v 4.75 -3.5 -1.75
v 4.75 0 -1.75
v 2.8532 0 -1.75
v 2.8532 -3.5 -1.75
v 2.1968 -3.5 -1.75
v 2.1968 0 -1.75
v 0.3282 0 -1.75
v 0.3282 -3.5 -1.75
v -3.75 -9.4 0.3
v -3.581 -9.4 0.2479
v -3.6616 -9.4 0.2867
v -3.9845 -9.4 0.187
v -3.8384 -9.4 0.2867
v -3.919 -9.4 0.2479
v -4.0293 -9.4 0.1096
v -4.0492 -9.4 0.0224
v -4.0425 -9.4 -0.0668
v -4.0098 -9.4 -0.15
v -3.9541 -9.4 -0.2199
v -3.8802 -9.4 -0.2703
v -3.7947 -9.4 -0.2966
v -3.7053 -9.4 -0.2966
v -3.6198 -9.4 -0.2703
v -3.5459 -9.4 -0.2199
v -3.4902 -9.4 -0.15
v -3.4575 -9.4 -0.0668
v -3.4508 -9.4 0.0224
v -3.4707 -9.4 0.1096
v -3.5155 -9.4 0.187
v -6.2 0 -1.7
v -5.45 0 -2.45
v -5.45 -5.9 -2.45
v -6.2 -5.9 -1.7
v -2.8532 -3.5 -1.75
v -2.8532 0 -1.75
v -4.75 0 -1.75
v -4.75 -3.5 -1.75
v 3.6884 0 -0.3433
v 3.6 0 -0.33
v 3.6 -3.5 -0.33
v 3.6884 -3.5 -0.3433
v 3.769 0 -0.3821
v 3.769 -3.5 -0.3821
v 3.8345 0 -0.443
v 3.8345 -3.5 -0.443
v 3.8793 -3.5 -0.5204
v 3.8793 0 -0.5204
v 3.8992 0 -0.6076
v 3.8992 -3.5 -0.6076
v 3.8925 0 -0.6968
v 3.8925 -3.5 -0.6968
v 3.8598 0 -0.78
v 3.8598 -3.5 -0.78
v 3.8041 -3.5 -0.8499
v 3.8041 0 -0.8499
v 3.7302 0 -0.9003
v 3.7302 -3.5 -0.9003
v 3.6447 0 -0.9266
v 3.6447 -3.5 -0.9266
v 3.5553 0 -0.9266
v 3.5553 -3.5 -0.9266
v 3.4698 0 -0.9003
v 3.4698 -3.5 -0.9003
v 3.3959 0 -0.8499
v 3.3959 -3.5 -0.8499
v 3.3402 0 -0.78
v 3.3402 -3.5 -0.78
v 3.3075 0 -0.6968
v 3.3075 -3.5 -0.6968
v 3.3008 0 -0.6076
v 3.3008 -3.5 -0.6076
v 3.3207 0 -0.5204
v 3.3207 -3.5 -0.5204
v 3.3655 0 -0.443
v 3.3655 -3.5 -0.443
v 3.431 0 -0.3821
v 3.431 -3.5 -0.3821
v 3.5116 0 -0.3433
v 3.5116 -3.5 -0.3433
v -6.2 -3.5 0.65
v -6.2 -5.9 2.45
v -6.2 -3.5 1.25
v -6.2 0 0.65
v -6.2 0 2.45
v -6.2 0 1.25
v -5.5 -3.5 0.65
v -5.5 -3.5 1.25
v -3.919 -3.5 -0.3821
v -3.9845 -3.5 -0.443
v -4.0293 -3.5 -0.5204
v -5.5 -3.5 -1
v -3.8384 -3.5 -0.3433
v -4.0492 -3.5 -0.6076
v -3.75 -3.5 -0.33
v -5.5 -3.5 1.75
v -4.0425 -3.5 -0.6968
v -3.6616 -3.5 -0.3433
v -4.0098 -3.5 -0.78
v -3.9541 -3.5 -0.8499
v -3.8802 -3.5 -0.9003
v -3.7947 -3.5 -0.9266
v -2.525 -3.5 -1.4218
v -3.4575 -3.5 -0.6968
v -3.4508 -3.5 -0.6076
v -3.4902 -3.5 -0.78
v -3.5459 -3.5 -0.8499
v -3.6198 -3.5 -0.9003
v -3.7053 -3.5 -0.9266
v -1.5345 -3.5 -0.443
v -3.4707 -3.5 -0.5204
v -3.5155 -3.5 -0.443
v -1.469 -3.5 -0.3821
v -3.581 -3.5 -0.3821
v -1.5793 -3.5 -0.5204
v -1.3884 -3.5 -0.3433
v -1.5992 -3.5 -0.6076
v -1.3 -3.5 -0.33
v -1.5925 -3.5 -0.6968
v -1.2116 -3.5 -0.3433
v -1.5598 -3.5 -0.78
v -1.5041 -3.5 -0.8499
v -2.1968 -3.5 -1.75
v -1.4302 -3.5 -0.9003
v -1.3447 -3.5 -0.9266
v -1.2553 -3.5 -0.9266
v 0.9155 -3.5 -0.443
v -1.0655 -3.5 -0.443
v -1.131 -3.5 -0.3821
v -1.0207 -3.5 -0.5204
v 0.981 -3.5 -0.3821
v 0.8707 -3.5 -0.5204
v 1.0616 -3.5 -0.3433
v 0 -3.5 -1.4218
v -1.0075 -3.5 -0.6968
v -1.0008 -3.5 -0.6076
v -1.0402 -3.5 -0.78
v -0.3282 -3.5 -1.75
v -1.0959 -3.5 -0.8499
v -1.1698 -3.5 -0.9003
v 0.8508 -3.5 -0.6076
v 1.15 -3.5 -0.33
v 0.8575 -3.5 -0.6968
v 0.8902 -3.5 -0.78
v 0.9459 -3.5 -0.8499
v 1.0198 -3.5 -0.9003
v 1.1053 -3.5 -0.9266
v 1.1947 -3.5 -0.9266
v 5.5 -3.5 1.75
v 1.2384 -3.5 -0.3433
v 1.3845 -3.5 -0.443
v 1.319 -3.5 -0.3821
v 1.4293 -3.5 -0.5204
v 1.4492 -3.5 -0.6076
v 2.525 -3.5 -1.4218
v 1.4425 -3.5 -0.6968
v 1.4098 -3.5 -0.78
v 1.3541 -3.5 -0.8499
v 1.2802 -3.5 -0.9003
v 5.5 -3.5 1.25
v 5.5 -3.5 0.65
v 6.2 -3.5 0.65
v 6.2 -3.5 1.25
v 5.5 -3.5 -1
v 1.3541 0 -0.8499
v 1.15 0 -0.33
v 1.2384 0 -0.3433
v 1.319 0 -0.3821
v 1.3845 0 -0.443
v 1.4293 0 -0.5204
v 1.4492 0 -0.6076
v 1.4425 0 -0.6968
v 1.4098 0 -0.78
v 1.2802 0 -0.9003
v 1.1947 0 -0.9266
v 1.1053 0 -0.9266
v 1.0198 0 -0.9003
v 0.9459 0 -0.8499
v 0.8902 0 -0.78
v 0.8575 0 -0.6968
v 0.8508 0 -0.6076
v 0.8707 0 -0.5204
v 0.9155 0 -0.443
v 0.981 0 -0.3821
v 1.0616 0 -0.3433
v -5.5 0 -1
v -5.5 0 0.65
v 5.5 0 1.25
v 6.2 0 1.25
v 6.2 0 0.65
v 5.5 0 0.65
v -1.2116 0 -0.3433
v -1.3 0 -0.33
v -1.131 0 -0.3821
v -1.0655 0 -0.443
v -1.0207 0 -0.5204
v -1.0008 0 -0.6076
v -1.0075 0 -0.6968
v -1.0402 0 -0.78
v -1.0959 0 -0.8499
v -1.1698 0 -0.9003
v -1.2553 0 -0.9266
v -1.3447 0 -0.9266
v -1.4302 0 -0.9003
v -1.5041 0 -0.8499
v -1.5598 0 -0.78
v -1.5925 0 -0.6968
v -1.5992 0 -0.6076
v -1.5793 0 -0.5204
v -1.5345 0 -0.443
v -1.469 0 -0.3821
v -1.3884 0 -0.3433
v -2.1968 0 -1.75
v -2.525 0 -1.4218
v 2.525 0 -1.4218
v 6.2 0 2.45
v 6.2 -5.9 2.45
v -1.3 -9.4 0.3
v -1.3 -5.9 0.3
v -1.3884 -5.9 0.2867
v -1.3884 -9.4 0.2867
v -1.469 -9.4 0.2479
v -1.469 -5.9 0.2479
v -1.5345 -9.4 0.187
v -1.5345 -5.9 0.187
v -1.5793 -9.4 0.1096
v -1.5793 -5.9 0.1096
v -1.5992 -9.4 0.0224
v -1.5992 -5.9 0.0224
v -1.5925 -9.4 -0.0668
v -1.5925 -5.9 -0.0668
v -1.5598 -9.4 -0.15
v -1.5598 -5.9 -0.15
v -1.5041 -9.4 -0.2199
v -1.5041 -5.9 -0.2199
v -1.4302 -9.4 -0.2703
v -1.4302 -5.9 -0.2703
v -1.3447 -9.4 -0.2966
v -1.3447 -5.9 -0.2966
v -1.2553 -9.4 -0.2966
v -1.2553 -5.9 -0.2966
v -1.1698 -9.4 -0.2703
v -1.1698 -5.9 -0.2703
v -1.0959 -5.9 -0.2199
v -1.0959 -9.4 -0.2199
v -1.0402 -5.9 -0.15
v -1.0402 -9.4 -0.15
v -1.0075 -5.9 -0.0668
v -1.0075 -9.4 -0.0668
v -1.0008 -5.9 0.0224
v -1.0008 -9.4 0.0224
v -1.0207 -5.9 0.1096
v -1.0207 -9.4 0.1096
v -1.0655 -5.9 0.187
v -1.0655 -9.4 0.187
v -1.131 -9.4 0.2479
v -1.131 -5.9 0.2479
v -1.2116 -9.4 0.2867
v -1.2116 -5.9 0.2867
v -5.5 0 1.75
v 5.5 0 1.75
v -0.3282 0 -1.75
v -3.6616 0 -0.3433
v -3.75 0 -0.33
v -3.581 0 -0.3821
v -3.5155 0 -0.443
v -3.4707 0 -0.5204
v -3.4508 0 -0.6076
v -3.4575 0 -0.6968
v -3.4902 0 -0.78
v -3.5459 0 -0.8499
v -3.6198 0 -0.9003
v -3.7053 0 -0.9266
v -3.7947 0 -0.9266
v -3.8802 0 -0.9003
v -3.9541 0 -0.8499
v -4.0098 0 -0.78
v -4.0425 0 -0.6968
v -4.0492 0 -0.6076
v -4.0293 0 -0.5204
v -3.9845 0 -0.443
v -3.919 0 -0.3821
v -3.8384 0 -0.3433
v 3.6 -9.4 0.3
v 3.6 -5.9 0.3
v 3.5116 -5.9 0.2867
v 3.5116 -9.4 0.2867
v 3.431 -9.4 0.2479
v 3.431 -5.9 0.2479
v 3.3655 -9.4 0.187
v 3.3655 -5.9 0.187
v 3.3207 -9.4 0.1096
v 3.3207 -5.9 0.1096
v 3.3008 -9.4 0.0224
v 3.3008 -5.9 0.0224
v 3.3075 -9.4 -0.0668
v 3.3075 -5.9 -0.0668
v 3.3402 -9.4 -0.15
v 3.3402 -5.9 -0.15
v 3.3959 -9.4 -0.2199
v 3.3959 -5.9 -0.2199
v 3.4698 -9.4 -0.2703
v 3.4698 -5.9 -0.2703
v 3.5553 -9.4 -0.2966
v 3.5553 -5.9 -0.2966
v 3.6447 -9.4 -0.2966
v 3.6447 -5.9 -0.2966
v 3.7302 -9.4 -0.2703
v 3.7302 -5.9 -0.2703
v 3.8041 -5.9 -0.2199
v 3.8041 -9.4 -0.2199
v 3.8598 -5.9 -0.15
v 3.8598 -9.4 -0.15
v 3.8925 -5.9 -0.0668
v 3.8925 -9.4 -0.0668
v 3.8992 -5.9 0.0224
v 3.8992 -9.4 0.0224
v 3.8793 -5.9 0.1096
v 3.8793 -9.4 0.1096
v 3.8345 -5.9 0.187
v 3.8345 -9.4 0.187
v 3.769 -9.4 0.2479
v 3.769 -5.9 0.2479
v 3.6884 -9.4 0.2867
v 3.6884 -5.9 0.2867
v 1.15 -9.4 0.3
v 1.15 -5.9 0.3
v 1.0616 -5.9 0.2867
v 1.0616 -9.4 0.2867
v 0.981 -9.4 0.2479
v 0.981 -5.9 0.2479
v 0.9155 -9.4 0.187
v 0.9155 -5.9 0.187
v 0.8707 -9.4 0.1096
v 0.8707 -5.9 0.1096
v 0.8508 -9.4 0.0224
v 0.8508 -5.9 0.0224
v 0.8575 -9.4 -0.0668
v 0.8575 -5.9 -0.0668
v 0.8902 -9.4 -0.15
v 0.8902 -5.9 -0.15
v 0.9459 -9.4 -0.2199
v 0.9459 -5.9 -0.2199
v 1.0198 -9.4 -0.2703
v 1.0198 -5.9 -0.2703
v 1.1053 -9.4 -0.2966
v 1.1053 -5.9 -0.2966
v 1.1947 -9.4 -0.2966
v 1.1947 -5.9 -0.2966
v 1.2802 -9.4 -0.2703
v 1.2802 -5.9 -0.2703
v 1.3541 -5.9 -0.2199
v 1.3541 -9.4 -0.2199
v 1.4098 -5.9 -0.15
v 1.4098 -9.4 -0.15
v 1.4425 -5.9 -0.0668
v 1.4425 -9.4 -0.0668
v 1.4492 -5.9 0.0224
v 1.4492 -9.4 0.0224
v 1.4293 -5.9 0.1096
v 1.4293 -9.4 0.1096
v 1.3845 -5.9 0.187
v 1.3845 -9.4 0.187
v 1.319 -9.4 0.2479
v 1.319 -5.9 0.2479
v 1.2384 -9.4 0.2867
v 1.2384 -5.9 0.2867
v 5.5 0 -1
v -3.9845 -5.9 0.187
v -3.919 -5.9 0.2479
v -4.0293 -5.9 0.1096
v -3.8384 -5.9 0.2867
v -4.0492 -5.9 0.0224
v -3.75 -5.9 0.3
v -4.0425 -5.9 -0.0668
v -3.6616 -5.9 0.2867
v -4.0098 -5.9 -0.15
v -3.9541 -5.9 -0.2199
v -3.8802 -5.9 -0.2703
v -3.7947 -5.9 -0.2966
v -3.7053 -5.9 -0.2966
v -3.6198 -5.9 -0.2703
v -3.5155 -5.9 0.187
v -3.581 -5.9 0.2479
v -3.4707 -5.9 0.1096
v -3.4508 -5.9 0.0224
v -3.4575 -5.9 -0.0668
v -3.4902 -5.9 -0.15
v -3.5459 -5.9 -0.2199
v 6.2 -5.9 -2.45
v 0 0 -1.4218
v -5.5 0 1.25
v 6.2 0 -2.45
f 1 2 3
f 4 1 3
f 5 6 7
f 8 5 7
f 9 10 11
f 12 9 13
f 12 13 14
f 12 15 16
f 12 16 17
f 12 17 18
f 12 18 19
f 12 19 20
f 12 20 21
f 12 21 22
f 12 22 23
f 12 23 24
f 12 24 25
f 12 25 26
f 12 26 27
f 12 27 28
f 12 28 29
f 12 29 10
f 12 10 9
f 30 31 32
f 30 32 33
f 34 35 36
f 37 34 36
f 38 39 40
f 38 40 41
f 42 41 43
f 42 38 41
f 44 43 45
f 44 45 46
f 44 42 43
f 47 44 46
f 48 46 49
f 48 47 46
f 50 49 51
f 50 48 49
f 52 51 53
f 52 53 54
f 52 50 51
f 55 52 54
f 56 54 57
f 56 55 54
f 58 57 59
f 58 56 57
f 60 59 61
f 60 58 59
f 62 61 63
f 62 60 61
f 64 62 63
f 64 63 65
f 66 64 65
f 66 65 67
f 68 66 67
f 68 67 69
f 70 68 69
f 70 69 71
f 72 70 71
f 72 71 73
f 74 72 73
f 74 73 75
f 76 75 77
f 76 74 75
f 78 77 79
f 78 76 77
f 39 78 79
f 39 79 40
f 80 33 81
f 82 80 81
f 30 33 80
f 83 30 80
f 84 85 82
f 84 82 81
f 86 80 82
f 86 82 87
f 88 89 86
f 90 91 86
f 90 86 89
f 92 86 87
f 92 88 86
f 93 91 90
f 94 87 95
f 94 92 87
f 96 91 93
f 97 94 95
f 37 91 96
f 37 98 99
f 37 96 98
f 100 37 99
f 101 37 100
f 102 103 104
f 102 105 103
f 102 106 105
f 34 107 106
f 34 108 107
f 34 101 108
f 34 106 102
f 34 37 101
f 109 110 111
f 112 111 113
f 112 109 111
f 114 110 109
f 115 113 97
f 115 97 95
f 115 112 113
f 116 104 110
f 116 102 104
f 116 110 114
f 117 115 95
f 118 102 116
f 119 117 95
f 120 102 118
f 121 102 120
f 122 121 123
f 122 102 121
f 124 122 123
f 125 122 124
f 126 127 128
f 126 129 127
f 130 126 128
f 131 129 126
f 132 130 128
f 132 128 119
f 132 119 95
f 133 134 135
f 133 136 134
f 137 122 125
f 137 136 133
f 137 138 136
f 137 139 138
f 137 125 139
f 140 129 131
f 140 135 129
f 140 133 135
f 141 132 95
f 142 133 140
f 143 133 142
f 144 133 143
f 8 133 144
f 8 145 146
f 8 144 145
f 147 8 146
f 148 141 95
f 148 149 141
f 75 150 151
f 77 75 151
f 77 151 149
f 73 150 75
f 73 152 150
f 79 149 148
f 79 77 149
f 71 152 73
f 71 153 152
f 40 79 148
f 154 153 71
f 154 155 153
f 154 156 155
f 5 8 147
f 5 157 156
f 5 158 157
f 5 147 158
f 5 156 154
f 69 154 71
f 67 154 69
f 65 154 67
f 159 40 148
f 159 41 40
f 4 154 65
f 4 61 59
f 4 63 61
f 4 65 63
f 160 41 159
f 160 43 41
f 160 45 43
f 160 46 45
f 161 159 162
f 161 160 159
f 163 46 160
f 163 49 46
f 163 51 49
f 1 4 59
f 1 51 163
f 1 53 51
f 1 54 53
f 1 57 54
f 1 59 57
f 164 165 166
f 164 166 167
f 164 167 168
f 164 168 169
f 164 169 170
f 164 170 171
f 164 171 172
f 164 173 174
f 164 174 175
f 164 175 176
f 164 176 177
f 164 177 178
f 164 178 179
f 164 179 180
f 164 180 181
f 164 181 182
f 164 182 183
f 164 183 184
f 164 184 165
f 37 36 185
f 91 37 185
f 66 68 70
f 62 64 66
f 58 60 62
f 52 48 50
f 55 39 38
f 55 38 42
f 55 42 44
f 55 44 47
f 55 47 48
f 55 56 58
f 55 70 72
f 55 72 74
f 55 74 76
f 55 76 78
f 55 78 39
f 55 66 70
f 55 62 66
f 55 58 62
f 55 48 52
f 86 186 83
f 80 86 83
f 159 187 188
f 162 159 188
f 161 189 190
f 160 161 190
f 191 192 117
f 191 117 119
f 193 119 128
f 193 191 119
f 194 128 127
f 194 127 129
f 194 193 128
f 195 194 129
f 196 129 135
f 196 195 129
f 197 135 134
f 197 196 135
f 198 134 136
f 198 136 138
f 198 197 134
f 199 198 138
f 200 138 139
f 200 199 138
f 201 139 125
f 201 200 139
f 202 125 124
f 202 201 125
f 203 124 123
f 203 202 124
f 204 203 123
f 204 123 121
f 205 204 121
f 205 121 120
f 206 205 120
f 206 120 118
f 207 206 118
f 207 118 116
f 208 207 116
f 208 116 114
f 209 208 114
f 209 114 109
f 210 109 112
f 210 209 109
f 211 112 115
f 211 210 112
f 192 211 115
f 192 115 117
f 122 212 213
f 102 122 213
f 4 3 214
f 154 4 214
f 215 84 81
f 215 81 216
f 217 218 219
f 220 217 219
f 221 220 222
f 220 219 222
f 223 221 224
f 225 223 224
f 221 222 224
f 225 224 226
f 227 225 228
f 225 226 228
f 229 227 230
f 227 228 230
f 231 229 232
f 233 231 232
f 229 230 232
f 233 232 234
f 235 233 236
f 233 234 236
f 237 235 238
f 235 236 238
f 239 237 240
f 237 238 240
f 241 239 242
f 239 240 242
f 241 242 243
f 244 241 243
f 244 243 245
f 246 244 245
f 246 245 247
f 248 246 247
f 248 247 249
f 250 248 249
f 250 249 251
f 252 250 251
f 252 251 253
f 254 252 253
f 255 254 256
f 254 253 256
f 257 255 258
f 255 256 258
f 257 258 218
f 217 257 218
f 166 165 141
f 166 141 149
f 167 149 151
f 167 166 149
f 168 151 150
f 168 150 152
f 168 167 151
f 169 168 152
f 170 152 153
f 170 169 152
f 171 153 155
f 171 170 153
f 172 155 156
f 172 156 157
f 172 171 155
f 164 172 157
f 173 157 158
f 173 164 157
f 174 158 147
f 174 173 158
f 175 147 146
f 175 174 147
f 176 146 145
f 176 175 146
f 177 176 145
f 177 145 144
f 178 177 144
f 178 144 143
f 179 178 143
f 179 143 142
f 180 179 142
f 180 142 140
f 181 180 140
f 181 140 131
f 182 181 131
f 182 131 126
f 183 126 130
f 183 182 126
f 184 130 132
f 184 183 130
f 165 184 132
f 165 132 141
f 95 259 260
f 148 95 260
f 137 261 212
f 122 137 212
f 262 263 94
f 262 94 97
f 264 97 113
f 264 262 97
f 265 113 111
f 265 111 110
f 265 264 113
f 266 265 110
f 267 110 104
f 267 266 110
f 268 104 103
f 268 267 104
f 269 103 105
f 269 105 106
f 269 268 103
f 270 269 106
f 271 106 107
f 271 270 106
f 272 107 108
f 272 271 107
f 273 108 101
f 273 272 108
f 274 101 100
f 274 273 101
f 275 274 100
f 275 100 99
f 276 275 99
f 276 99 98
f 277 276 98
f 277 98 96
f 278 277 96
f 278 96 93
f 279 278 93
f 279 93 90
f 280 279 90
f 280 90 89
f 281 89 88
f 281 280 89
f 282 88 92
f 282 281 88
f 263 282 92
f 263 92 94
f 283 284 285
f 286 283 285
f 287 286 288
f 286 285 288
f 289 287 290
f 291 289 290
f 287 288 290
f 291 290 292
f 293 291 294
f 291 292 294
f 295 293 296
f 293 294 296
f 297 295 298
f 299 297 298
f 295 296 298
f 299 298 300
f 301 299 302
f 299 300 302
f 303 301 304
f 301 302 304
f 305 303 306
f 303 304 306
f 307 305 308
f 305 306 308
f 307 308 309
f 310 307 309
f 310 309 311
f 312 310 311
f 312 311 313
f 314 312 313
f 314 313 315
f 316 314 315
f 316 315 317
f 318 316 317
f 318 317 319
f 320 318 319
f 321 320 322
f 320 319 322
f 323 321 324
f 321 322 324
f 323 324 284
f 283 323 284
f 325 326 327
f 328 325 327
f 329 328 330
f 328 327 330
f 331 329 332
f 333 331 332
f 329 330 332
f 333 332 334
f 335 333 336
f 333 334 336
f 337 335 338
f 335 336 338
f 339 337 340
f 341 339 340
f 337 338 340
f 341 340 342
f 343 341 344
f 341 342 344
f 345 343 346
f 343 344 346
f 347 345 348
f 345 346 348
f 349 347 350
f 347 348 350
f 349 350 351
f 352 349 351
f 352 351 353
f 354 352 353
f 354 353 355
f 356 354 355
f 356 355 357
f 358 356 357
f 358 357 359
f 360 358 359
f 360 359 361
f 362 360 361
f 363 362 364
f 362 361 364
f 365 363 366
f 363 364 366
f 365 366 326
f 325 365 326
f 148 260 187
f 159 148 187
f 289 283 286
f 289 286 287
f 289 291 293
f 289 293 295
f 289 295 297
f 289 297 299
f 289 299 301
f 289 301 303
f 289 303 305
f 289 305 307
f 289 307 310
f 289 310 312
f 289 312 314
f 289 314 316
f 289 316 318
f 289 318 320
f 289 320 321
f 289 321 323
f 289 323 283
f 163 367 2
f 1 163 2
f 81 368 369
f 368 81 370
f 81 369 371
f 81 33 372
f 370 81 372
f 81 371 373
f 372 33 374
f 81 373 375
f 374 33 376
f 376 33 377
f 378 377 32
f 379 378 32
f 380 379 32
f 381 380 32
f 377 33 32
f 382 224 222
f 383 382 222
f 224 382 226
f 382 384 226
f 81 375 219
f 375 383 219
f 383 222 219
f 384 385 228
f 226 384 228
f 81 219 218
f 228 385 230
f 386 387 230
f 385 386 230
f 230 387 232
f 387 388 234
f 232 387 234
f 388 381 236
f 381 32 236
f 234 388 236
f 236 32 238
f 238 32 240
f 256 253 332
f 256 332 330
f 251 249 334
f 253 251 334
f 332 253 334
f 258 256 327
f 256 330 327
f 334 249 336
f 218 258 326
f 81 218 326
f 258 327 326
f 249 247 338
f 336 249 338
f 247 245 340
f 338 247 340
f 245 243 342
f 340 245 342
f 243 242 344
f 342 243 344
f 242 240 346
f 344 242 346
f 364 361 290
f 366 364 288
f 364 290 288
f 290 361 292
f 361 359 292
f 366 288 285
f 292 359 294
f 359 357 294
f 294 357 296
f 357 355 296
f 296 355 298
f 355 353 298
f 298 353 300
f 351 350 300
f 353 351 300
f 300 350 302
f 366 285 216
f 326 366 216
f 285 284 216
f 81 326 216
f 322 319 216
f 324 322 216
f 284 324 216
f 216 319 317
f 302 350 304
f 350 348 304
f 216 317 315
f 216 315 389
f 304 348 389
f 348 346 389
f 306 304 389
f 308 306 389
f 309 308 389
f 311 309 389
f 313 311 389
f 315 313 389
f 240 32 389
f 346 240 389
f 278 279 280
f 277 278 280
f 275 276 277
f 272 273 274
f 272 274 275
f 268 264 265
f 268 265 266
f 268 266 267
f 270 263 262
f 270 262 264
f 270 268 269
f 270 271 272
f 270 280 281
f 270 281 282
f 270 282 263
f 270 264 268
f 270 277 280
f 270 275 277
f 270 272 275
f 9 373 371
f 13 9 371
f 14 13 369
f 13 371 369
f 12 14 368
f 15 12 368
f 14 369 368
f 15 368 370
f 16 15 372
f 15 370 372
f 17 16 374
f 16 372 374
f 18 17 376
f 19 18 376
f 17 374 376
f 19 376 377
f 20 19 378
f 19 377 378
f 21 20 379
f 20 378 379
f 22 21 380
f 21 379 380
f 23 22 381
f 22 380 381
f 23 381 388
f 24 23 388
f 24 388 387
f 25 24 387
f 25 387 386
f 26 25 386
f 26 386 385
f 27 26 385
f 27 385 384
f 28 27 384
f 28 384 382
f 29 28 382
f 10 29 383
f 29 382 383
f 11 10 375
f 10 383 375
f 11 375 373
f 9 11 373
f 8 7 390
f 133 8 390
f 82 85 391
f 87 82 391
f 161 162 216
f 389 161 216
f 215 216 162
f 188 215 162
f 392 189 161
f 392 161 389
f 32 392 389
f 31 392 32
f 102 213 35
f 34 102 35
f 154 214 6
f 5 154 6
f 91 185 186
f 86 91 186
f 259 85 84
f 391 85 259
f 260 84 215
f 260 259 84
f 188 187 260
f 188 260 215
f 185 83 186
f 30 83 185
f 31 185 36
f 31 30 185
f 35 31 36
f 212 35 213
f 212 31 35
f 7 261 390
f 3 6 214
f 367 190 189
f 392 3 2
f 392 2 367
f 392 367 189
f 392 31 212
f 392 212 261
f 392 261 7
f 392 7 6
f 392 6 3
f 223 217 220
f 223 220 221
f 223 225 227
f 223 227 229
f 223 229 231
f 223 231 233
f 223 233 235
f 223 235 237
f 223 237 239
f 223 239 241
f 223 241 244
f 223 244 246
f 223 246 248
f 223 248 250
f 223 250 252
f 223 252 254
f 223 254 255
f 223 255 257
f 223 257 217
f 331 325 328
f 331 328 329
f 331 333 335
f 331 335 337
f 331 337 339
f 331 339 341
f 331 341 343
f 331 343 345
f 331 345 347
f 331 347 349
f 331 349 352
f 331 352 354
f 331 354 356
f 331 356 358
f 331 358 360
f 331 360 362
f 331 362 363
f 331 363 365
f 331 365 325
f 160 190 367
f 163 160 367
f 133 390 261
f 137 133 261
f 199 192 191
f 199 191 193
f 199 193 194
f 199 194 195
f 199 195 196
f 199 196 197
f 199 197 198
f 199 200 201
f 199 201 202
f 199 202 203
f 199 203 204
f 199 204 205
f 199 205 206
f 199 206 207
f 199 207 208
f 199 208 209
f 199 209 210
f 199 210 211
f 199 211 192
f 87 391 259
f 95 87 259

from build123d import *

# Parameters (mm, degrees)
BOSS_EXTRUDE1_DEPTH = 5.9
SKETCH2_R           = 0.3
BOSS_EXTRUDE2_DEPTH = 3.5
SKETCH3_R           = 0.3
CUT_EXTRUDE1_DEPTH  = 3.5


with BuildPart() as part:
    # Sketch1 → Boss-Extrude1 (new body)
    with BuildSketch(Plane(origin=(0, 0, 0), x_dir=(1, 0, 0), z_dir=(0, 1, 0))):
        Polygon((-5.45, 2.45), (-6.2, 1.7), (-6.2, -2.45), (6.2, -2.45), (6.2, 2.45), align=None)
    extrude(amount=-BOSS_EXTRUDE1_DEPTH)

    # Sketch2 → Boss-Extrude2 (add)
    with BuildSketch(Plane.XZ.offset(5.9)):
        with Locations(Location((-3.75, 0, 0), (0, 0, 90))):
            Circle(SKETCH2_R)
        with Locations(Location((-1.3, 0, 0), (0, 0, 90))):
            Circle(SKETCH2_R)
        with Locations(Location((1.15, 0, 0), (0, 0, 90))):
            Circle(SKETCH2_R)
        with Locations(Location((3.6, 0, 0), (0, 0, 90))):
            Circle(SKETCH2_R)
    extrude(amount=BOSS_EXTRUDE2_DEPTH)

    # Sketch3 → Cut-Extrude1 (cut)
    with BuildSketch(Plane(origin=(0, 0, 0), x_dir=(1, 0, 0), z_dir=(0, 1, 0))):
        Polygon((-2.853247496, 1.75), (-4.75, 1.75), (-5.5, 1), (-5.5, -0.65), (-6.2, -0.65), (-6.2, -1.25), (-5.5, -1.25), (-5.5, -1.75), (5.5, -1.75), (5.5, -1.25), (6.2, -1.25), (6.2, -0.65), (5.5, -0.65), (5.5, 1), (4.75, 1.75), (2.853247496, 1.75), (2.525, 1.421752504), (2.196752504, 1.75), (0.328247496, 1.75), (0, 1.421752504), (-0.328247496, 1.75), (-2.196752504, 1.75), (-2.525, 1.421752504), align=None)
        with Locations(Location((-3.75, 0.63, 0), (0, 0, 270))):
            Circle(SKETCH3_R, mode=Mode.SUBTRACT)
        with Locations(Location((-1.3, 0.63, 0), (0, 0, 270))):
            Circle(SKETCH3_R, mode=Mode.SUBTRACT)
        with Locations(Location((1.15, 0.63, 0), (0, 0, 270))):
            Circle(SKETCH3_R, mode=Mode.SUBTRACT)
        with Locations(Location((3.6, 0.63, 0), (0, 0, 270))):
            Circle(SKETCH3_R, mode=Mode.SUBTRACT)
    extrude(amount=-CUT_EXTRUDE1_DEPTH, mode=Mode.SUBTRACT)


solid = part.part
